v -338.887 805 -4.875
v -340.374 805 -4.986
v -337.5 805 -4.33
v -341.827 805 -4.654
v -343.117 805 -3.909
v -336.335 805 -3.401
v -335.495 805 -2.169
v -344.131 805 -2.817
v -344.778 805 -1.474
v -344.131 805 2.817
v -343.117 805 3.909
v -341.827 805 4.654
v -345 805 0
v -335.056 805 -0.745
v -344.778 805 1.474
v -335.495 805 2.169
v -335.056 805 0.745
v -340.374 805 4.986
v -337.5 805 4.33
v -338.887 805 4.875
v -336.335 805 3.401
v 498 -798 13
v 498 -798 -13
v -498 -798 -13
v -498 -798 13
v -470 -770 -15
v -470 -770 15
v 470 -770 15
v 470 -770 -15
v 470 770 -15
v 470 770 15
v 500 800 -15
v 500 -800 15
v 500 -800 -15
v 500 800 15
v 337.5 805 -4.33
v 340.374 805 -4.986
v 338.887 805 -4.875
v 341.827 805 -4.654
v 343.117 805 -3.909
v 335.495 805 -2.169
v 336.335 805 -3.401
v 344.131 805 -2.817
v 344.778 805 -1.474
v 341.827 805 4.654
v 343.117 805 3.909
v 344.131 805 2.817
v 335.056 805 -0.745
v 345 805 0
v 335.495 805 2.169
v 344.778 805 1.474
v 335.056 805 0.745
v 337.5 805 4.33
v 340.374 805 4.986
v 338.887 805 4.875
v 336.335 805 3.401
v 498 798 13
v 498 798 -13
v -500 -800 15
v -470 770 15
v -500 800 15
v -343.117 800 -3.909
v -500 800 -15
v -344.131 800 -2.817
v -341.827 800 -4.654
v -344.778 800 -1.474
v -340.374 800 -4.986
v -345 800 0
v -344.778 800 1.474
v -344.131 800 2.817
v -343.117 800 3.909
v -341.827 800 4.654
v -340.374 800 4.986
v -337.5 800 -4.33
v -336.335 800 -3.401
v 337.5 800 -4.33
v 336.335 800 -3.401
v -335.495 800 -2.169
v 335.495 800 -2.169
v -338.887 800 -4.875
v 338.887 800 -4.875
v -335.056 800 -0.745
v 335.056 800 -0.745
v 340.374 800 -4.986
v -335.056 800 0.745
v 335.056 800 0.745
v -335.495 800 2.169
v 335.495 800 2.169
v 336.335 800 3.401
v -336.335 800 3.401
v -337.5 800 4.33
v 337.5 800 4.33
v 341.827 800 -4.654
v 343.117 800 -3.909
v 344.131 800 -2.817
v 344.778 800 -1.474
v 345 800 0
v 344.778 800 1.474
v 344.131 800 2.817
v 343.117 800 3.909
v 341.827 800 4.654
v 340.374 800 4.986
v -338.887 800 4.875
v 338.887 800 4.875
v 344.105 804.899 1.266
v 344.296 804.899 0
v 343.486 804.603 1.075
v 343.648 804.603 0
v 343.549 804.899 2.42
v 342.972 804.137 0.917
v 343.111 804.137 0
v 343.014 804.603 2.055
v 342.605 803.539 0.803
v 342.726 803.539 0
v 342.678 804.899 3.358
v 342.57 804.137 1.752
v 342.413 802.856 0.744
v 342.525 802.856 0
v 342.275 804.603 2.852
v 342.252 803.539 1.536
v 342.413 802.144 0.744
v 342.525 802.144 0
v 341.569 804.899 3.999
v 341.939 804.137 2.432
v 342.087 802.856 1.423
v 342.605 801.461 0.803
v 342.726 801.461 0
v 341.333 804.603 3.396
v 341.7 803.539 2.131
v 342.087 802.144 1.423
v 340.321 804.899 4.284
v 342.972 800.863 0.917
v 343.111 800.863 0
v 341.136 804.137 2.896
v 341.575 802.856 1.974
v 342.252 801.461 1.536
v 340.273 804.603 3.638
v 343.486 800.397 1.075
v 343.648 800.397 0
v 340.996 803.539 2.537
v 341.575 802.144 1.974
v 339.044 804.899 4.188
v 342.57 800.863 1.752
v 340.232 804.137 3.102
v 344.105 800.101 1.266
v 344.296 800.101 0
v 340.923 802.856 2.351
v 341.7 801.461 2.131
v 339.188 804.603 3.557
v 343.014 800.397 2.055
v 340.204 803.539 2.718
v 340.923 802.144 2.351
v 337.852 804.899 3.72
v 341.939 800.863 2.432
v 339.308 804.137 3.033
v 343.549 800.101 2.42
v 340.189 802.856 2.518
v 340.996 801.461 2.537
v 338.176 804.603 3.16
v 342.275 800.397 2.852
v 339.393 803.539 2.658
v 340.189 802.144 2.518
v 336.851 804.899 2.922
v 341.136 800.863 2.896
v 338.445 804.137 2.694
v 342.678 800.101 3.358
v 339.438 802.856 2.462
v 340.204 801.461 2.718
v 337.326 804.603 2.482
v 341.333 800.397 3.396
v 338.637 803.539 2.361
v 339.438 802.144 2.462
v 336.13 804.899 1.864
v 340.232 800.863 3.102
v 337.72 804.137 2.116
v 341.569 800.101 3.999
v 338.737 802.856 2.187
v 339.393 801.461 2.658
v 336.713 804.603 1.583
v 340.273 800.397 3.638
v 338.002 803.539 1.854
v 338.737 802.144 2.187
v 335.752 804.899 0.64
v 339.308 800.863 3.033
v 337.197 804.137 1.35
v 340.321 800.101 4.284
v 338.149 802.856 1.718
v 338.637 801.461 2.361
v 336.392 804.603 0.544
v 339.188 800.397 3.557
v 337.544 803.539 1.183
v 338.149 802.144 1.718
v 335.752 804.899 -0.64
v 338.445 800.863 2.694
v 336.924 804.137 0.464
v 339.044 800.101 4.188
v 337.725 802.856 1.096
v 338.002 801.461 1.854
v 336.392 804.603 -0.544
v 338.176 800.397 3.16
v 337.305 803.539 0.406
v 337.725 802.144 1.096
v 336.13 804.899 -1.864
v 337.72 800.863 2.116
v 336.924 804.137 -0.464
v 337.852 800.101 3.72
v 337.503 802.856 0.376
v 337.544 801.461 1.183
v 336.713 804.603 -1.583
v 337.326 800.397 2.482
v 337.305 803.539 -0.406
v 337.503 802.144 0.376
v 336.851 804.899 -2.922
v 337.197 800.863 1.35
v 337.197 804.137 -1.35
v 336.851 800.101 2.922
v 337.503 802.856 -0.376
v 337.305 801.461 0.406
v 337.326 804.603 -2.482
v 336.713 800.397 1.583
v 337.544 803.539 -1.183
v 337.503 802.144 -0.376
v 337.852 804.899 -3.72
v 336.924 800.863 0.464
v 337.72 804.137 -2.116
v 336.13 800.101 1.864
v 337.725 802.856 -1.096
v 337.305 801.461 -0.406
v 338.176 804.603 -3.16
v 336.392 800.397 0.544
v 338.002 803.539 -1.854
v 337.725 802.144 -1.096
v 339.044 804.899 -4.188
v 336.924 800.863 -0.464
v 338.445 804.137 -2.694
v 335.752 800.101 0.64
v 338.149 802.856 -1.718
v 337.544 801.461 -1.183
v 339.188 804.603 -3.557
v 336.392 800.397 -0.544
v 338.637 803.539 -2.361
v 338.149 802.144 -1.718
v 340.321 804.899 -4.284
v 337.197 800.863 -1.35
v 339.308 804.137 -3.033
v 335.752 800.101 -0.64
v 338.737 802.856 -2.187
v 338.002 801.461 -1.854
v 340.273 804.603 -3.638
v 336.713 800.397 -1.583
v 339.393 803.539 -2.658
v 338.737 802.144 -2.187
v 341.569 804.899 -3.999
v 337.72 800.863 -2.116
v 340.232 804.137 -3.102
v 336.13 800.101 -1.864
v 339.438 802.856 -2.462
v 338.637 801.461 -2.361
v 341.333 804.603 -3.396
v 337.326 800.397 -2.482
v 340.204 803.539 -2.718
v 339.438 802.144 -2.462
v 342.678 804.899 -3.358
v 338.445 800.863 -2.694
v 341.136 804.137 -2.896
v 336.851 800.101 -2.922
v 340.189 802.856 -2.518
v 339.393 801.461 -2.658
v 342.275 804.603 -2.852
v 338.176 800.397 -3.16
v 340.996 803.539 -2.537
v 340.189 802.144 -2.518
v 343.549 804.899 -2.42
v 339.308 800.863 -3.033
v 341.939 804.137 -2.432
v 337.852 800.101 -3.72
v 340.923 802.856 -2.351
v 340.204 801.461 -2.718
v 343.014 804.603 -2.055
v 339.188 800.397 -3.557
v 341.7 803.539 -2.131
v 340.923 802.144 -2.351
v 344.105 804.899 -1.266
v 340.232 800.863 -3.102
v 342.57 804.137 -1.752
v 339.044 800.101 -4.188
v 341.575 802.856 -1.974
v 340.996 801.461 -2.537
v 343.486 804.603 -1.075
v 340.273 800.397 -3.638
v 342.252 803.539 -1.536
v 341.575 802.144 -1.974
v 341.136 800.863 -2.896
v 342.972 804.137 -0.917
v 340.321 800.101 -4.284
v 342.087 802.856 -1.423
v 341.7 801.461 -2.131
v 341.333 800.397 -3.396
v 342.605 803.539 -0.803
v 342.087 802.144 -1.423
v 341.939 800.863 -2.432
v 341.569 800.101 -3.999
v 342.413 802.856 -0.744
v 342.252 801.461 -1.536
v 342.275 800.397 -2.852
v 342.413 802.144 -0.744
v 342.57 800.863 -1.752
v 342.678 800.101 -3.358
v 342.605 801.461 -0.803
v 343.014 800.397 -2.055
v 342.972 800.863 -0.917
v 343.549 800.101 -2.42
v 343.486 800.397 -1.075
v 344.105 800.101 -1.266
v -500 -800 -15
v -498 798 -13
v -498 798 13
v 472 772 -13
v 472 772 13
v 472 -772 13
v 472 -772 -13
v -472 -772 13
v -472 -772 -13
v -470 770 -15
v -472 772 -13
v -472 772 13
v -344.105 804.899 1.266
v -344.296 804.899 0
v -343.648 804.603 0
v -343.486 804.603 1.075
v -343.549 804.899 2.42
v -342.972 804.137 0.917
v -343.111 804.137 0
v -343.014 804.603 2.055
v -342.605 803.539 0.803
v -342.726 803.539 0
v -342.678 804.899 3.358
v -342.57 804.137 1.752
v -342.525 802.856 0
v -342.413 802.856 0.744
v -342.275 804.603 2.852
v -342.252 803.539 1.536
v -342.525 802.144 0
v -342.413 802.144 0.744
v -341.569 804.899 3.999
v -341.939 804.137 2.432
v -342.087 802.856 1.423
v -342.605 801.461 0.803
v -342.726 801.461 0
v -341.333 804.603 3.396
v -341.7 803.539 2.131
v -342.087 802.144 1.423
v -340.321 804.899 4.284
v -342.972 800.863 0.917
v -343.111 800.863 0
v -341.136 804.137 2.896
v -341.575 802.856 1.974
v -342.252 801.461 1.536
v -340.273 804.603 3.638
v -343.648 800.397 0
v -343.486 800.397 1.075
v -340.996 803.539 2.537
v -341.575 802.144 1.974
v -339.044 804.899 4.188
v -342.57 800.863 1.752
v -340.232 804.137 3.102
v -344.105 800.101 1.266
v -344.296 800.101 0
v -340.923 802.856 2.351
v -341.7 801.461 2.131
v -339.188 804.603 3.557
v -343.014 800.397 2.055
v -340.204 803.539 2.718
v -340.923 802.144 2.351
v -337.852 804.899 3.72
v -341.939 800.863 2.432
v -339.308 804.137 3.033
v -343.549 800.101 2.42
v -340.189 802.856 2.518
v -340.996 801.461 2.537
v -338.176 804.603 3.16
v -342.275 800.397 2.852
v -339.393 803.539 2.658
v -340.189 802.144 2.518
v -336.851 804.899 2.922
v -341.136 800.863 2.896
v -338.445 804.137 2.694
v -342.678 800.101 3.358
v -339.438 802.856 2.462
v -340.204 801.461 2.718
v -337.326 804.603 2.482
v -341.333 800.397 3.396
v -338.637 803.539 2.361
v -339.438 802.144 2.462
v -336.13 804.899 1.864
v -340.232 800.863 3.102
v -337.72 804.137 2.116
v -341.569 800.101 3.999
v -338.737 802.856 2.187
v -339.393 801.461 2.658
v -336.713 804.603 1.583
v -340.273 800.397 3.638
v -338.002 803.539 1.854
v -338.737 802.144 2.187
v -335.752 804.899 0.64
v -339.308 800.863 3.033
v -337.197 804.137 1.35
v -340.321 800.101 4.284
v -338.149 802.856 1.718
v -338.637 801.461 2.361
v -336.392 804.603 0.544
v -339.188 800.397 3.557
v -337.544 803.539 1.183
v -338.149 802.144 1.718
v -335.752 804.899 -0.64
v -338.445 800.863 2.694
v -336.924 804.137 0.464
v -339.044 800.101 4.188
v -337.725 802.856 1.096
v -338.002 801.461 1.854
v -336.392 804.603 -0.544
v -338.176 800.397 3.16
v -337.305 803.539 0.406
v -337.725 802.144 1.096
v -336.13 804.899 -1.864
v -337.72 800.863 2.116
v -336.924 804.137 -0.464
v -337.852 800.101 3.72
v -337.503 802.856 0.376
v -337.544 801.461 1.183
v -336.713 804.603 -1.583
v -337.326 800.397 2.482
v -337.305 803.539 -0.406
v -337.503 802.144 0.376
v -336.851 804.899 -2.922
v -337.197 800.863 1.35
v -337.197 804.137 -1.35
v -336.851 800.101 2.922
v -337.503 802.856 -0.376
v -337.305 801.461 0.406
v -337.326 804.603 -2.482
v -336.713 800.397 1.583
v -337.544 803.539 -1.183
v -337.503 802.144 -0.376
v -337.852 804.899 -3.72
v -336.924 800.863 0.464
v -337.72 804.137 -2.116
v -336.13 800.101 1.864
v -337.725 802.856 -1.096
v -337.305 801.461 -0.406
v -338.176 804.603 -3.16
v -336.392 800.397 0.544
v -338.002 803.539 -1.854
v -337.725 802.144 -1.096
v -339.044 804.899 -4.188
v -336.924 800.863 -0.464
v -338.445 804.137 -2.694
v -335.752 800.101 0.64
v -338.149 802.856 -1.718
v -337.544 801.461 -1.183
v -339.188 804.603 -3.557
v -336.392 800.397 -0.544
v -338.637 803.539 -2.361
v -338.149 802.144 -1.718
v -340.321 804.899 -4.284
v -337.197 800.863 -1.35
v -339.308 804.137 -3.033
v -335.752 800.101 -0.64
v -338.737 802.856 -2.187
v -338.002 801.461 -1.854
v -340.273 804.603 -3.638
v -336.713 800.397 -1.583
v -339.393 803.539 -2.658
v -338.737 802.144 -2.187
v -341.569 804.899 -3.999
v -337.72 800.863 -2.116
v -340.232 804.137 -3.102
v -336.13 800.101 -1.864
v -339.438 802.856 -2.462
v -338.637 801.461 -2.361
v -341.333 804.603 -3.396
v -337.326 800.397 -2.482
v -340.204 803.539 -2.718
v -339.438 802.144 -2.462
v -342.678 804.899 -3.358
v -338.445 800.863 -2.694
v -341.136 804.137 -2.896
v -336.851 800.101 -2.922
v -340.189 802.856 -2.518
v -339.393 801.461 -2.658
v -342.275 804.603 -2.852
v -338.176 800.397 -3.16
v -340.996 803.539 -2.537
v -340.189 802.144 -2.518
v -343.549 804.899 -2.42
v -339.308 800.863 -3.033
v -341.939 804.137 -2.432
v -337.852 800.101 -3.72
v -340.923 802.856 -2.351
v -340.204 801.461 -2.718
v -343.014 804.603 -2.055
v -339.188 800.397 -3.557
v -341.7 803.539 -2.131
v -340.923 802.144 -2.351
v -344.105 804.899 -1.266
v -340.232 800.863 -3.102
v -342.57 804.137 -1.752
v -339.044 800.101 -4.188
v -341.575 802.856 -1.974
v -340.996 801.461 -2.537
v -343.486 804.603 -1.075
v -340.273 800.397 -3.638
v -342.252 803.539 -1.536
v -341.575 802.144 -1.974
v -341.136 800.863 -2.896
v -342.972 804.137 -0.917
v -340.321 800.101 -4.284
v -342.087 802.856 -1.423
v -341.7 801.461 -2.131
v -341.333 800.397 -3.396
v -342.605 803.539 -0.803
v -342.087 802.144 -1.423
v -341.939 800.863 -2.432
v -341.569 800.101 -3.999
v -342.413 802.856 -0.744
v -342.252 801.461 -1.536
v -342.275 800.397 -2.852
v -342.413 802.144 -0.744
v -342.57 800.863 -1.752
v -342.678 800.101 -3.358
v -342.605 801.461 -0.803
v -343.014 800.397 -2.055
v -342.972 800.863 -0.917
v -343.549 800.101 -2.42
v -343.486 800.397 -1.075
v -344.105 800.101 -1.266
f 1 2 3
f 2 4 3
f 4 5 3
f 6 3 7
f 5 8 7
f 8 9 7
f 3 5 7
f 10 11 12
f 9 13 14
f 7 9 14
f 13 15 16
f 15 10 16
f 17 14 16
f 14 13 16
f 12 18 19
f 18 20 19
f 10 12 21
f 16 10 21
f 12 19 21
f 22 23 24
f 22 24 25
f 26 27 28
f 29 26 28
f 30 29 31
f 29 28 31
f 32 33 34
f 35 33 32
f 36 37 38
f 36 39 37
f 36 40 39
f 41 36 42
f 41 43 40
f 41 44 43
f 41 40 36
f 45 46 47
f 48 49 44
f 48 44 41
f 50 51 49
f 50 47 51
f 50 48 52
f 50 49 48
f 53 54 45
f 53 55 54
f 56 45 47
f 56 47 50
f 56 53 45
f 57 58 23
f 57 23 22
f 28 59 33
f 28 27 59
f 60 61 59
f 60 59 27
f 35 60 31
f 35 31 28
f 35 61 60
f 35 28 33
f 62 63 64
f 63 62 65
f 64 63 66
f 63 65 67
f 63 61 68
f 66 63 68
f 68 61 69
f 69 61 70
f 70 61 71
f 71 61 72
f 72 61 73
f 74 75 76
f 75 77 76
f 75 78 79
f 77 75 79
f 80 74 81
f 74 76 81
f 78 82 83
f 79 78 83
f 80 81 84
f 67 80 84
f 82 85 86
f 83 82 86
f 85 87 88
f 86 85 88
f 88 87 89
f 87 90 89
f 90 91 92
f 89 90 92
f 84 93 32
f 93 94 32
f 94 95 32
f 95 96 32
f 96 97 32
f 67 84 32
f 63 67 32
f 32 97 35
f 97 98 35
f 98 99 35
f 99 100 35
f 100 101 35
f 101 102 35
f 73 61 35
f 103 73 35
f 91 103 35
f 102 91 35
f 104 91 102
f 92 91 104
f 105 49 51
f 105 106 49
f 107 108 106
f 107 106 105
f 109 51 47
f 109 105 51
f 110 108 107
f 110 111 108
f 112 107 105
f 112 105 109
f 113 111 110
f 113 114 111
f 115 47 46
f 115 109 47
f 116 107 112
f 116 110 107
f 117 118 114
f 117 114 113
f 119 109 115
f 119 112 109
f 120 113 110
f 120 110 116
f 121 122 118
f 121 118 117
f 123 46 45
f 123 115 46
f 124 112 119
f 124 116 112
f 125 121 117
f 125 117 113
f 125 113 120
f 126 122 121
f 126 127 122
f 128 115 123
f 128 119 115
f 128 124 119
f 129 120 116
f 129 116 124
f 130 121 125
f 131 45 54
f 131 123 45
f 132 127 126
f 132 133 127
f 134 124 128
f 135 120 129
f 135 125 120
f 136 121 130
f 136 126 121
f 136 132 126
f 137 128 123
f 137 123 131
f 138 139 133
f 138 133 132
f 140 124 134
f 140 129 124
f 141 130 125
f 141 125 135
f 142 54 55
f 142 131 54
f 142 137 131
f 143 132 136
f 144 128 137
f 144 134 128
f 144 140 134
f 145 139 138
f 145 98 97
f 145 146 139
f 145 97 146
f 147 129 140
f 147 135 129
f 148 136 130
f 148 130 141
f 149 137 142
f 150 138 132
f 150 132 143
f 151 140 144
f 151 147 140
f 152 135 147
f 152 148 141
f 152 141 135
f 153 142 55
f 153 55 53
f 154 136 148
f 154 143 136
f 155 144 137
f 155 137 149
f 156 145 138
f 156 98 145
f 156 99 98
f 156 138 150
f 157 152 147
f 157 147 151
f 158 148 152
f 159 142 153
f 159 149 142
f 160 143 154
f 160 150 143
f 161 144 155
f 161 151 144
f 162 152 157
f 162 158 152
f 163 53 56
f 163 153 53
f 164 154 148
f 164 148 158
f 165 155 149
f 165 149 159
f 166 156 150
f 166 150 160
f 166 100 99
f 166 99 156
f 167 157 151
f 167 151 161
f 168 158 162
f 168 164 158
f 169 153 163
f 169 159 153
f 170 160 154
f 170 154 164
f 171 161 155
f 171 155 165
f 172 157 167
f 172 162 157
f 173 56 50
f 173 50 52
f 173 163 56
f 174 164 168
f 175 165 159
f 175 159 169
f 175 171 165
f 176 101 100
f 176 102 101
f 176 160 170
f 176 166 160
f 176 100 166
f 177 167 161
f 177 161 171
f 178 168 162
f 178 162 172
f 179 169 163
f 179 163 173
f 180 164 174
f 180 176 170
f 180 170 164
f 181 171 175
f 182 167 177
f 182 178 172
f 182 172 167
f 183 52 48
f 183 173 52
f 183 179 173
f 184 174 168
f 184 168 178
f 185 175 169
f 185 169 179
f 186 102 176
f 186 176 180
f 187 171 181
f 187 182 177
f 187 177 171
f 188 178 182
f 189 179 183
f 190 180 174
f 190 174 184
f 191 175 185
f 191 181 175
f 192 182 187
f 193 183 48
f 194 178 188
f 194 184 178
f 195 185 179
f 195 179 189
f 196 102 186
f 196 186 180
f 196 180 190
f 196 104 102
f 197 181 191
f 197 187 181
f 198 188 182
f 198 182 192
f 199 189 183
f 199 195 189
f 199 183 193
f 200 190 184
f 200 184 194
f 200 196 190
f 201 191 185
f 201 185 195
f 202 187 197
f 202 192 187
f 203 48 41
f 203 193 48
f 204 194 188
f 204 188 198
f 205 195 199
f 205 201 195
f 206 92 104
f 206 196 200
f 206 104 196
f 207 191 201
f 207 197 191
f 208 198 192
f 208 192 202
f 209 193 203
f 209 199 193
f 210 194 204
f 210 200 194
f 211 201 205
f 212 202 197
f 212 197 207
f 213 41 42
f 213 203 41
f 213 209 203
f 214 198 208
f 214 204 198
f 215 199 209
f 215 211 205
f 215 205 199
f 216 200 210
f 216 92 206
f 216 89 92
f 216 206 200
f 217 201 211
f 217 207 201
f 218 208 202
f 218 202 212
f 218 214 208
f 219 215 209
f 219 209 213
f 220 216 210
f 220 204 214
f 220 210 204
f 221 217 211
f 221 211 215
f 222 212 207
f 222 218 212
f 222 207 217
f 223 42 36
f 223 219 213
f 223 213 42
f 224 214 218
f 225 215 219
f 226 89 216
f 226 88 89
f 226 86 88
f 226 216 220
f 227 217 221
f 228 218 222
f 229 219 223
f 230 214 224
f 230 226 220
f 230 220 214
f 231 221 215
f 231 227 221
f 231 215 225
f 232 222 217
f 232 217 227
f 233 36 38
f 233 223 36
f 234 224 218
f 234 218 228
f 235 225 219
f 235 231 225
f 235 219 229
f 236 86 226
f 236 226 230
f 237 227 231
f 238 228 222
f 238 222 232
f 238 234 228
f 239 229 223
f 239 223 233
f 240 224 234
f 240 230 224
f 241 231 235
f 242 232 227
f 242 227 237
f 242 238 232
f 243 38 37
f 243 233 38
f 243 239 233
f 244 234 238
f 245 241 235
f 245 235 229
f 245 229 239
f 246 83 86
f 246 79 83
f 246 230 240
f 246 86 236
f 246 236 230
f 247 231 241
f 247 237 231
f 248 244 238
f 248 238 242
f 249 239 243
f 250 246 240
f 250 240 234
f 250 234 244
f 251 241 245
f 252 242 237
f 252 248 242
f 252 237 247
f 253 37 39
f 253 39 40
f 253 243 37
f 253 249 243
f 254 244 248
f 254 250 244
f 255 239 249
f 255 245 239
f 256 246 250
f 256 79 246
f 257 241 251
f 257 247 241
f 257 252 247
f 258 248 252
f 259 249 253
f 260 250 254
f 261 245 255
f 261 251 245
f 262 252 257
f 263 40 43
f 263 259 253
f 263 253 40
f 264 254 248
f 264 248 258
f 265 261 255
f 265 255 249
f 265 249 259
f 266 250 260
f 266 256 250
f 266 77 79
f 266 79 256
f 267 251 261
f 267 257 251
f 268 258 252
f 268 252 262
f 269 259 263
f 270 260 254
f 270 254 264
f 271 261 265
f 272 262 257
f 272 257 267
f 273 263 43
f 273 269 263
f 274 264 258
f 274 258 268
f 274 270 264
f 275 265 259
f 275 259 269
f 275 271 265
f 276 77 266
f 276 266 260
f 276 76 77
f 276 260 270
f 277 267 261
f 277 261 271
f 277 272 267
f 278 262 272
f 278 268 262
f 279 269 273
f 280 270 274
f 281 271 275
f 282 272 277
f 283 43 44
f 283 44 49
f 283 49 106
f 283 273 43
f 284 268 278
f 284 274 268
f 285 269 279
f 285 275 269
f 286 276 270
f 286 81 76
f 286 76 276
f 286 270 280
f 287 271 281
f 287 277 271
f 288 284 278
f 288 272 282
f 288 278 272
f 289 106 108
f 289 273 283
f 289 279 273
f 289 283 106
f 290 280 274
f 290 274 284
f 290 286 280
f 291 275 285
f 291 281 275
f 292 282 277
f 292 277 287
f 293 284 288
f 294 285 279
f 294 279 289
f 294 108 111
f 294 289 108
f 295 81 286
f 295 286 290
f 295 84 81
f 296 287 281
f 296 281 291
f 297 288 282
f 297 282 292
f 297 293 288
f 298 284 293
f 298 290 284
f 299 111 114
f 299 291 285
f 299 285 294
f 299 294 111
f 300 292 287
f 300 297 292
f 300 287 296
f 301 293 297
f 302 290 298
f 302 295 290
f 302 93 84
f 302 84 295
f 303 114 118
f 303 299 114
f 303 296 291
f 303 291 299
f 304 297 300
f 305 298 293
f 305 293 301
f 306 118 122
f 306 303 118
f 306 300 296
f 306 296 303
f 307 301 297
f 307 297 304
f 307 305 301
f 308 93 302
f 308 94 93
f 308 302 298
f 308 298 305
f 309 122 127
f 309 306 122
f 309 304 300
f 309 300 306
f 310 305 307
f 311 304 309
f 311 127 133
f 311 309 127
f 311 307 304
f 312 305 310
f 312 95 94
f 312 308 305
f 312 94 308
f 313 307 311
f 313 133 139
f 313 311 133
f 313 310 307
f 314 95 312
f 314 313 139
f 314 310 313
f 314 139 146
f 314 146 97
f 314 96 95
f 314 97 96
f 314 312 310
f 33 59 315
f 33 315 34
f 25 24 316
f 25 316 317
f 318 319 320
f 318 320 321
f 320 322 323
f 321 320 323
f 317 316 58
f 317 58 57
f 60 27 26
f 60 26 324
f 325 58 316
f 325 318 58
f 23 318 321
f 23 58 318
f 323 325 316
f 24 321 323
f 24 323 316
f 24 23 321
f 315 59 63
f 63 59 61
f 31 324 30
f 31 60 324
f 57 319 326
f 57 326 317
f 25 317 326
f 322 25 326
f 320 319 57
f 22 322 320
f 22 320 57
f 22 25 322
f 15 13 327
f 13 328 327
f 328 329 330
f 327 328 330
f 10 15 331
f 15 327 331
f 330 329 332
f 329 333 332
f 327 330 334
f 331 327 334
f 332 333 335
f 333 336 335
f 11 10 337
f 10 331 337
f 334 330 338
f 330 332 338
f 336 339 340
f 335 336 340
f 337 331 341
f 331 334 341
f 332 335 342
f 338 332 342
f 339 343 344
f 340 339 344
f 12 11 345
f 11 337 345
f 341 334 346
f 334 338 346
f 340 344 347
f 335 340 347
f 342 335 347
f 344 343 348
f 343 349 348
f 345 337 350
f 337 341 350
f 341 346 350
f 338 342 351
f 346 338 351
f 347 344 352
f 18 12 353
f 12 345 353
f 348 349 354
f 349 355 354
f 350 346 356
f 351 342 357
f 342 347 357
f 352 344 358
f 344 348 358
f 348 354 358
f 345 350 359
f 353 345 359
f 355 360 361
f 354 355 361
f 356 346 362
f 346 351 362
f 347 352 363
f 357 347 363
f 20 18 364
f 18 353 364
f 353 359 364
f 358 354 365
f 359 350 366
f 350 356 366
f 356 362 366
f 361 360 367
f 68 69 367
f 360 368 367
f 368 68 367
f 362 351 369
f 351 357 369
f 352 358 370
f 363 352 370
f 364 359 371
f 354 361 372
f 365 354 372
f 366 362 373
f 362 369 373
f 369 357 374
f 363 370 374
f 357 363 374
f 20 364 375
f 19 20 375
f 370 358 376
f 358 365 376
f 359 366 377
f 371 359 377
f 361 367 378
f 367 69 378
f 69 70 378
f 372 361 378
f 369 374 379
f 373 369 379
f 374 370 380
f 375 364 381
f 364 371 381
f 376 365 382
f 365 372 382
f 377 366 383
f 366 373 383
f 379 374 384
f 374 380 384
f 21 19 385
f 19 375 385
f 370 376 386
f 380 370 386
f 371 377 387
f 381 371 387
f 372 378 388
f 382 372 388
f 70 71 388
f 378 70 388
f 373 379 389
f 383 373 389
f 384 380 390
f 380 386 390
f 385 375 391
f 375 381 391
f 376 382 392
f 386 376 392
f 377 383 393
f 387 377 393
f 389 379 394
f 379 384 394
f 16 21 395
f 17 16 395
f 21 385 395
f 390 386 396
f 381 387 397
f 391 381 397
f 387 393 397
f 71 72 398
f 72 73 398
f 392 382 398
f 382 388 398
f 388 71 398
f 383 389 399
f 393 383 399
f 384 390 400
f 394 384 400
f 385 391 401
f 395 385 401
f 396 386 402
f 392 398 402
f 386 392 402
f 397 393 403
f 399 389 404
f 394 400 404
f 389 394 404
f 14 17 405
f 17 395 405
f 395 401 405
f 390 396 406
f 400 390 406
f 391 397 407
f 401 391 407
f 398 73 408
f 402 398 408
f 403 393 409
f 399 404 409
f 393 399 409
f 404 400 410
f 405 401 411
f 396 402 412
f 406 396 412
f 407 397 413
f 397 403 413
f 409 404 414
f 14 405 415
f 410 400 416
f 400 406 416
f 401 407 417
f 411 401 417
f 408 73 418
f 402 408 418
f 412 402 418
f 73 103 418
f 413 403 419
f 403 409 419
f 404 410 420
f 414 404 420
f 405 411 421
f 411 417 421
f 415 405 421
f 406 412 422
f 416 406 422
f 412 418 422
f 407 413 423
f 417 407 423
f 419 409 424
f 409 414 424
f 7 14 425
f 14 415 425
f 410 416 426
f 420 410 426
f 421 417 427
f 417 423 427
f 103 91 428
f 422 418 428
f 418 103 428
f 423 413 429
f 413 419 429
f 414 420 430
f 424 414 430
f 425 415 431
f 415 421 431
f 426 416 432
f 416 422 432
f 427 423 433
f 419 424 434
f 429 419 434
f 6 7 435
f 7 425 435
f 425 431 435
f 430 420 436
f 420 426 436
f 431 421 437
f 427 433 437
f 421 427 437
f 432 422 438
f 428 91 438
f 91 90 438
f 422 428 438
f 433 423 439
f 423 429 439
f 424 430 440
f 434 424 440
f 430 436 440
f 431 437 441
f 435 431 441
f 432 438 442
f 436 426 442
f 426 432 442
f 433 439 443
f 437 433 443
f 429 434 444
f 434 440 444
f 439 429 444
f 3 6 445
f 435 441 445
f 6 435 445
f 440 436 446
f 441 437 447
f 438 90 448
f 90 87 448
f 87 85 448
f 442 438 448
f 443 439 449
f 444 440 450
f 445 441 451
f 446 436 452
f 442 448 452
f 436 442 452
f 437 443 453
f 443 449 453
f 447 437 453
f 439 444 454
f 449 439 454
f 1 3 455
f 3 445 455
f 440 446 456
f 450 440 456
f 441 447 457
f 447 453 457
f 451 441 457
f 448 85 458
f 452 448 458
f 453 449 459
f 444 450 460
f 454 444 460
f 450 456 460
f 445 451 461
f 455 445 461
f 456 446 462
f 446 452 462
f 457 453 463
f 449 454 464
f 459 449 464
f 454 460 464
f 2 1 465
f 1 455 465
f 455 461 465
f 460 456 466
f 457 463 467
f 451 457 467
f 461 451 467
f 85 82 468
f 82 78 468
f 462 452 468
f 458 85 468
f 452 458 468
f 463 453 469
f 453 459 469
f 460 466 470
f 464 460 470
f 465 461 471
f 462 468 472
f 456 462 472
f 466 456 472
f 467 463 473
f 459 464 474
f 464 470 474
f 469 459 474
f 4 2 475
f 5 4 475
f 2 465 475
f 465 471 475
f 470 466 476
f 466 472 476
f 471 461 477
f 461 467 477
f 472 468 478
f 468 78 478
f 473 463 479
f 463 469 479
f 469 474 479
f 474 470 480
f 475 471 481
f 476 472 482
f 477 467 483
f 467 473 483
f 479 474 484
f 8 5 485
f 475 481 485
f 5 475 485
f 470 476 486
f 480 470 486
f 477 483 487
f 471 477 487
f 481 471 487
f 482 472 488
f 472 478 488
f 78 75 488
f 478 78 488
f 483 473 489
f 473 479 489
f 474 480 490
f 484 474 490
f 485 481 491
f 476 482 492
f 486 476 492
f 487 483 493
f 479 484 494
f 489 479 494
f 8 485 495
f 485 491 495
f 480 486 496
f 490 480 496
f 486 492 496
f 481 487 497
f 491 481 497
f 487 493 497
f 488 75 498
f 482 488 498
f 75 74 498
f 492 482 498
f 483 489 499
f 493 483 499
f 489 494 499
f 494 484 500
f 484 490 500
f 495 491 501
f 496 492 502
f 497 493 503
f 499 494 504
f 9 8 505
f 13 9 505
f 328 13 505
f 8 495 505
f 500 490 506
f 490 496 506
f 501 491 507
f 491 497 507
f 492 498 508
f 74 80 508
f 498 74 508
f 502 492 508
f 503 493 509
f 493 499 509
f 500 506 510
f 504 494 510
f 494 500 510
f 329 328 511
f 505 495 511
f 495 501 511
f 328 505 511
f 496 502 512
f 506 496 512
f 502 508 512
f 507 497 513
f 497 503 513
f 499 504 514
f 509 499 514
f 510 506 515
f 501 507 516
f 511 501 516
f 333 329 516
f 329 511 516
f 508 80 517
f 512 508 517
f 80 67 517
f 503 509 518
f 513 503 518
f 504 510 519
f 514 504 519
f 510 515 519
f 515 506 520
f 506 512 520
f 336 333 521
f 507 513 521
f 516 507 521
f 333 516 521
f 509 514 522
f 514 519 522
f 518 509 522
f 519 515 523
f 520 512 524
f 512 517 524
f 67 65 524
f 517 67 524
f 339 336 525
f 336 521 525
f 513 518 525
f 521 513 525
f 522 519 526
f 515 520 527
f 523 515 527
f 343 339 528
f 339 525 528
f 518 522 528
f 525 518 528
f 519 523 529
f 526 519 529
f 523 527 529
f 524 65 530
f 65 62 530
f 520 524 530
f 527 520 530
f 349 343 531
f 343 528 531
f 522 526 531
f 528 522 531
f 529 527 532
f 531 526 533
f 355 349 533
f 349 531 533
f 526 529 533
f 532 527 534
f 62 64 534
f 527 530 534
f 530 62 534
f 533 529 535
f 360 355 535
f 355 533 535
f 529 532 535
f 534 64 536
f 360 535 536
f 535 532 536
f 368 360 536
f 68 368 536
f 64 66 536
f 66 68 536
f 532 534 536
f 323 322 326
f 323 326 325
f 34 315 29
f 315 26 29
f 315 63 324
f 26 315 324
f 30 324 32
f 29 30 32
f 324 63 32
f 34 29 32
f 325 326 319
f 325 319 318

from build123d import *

# Parameters (mm, degrees)
SKETCH1_W           = 1000
SKETCH1_H           = 1600
SKETCH1_W_2         = 940
SKETCH1_H_2         = 1540
BOSS_EXTRUDE1_DEPTH = 15
SKETCH2_W           = 26
SKETCH2_H           = 26


with BuildPart() as part:
    # Sketch1 → Boss-Extrude1 (new body, symmetric)
    with BuildSketch(Plane.XY):
        Rectangle(SKETCH1_W, SKETCH1_H)
        Rectangle(SKETCH1_W_2, SKETCH1_H_2, mode=Mode.SUBTRACT)
    extrude(amount=BOSS_EXTRUDE1_DEPTH, both=True)

    # Cut-Sweep1: sweep along a path in Sketch4
    with BuildLine(Plane.XY) as cut_sweep1_path:
        Line((-485, 785), (-485, -785))
        Line((-485, -785), (485, -785))
        Line((485, -785), (485, 785))
        Line((485, 785), (-485, 785))
    # Sketch2 → Cut-Sweep1 (sweep, cut)
    with BuildSketch(Plane(origin=(0, 0, 0), x_dir=(0, 0, -1), z_dir=(1, 0, 0))):
        with Locations((0, 785)):
            Rectangle(SKETCH2_W, SKETCH2_H)
    sweep(path=cut_sweep1_path.line, transition=Transition.RIGHT, mode=Mode.SUBTRACT)

    # Sketch7 → Revolve1 (revolve)
    with BuildSketch(Plane.XY):
        with BuildLine():
            Line((-340, 800), (-340, 805))
            Line((-340, 805), (-345, 805))
            ThreePointArc((-345, 805), (-342.5, 802.5), (-345, 800))
            Line((-345, 800), (-340, 800))
        make_face()
    revolve1 = revolve(axis=Axis((-340, 795.104340353, 0), (0, 1, 0)))

    # Mirror1: Revolve1 across plane
    add(revolve1.mirror(Plane(origin=(0, 0, 0), x_dir=(0, 0, 1), z_dir=(1, 0, 0))))


solid = part.part
